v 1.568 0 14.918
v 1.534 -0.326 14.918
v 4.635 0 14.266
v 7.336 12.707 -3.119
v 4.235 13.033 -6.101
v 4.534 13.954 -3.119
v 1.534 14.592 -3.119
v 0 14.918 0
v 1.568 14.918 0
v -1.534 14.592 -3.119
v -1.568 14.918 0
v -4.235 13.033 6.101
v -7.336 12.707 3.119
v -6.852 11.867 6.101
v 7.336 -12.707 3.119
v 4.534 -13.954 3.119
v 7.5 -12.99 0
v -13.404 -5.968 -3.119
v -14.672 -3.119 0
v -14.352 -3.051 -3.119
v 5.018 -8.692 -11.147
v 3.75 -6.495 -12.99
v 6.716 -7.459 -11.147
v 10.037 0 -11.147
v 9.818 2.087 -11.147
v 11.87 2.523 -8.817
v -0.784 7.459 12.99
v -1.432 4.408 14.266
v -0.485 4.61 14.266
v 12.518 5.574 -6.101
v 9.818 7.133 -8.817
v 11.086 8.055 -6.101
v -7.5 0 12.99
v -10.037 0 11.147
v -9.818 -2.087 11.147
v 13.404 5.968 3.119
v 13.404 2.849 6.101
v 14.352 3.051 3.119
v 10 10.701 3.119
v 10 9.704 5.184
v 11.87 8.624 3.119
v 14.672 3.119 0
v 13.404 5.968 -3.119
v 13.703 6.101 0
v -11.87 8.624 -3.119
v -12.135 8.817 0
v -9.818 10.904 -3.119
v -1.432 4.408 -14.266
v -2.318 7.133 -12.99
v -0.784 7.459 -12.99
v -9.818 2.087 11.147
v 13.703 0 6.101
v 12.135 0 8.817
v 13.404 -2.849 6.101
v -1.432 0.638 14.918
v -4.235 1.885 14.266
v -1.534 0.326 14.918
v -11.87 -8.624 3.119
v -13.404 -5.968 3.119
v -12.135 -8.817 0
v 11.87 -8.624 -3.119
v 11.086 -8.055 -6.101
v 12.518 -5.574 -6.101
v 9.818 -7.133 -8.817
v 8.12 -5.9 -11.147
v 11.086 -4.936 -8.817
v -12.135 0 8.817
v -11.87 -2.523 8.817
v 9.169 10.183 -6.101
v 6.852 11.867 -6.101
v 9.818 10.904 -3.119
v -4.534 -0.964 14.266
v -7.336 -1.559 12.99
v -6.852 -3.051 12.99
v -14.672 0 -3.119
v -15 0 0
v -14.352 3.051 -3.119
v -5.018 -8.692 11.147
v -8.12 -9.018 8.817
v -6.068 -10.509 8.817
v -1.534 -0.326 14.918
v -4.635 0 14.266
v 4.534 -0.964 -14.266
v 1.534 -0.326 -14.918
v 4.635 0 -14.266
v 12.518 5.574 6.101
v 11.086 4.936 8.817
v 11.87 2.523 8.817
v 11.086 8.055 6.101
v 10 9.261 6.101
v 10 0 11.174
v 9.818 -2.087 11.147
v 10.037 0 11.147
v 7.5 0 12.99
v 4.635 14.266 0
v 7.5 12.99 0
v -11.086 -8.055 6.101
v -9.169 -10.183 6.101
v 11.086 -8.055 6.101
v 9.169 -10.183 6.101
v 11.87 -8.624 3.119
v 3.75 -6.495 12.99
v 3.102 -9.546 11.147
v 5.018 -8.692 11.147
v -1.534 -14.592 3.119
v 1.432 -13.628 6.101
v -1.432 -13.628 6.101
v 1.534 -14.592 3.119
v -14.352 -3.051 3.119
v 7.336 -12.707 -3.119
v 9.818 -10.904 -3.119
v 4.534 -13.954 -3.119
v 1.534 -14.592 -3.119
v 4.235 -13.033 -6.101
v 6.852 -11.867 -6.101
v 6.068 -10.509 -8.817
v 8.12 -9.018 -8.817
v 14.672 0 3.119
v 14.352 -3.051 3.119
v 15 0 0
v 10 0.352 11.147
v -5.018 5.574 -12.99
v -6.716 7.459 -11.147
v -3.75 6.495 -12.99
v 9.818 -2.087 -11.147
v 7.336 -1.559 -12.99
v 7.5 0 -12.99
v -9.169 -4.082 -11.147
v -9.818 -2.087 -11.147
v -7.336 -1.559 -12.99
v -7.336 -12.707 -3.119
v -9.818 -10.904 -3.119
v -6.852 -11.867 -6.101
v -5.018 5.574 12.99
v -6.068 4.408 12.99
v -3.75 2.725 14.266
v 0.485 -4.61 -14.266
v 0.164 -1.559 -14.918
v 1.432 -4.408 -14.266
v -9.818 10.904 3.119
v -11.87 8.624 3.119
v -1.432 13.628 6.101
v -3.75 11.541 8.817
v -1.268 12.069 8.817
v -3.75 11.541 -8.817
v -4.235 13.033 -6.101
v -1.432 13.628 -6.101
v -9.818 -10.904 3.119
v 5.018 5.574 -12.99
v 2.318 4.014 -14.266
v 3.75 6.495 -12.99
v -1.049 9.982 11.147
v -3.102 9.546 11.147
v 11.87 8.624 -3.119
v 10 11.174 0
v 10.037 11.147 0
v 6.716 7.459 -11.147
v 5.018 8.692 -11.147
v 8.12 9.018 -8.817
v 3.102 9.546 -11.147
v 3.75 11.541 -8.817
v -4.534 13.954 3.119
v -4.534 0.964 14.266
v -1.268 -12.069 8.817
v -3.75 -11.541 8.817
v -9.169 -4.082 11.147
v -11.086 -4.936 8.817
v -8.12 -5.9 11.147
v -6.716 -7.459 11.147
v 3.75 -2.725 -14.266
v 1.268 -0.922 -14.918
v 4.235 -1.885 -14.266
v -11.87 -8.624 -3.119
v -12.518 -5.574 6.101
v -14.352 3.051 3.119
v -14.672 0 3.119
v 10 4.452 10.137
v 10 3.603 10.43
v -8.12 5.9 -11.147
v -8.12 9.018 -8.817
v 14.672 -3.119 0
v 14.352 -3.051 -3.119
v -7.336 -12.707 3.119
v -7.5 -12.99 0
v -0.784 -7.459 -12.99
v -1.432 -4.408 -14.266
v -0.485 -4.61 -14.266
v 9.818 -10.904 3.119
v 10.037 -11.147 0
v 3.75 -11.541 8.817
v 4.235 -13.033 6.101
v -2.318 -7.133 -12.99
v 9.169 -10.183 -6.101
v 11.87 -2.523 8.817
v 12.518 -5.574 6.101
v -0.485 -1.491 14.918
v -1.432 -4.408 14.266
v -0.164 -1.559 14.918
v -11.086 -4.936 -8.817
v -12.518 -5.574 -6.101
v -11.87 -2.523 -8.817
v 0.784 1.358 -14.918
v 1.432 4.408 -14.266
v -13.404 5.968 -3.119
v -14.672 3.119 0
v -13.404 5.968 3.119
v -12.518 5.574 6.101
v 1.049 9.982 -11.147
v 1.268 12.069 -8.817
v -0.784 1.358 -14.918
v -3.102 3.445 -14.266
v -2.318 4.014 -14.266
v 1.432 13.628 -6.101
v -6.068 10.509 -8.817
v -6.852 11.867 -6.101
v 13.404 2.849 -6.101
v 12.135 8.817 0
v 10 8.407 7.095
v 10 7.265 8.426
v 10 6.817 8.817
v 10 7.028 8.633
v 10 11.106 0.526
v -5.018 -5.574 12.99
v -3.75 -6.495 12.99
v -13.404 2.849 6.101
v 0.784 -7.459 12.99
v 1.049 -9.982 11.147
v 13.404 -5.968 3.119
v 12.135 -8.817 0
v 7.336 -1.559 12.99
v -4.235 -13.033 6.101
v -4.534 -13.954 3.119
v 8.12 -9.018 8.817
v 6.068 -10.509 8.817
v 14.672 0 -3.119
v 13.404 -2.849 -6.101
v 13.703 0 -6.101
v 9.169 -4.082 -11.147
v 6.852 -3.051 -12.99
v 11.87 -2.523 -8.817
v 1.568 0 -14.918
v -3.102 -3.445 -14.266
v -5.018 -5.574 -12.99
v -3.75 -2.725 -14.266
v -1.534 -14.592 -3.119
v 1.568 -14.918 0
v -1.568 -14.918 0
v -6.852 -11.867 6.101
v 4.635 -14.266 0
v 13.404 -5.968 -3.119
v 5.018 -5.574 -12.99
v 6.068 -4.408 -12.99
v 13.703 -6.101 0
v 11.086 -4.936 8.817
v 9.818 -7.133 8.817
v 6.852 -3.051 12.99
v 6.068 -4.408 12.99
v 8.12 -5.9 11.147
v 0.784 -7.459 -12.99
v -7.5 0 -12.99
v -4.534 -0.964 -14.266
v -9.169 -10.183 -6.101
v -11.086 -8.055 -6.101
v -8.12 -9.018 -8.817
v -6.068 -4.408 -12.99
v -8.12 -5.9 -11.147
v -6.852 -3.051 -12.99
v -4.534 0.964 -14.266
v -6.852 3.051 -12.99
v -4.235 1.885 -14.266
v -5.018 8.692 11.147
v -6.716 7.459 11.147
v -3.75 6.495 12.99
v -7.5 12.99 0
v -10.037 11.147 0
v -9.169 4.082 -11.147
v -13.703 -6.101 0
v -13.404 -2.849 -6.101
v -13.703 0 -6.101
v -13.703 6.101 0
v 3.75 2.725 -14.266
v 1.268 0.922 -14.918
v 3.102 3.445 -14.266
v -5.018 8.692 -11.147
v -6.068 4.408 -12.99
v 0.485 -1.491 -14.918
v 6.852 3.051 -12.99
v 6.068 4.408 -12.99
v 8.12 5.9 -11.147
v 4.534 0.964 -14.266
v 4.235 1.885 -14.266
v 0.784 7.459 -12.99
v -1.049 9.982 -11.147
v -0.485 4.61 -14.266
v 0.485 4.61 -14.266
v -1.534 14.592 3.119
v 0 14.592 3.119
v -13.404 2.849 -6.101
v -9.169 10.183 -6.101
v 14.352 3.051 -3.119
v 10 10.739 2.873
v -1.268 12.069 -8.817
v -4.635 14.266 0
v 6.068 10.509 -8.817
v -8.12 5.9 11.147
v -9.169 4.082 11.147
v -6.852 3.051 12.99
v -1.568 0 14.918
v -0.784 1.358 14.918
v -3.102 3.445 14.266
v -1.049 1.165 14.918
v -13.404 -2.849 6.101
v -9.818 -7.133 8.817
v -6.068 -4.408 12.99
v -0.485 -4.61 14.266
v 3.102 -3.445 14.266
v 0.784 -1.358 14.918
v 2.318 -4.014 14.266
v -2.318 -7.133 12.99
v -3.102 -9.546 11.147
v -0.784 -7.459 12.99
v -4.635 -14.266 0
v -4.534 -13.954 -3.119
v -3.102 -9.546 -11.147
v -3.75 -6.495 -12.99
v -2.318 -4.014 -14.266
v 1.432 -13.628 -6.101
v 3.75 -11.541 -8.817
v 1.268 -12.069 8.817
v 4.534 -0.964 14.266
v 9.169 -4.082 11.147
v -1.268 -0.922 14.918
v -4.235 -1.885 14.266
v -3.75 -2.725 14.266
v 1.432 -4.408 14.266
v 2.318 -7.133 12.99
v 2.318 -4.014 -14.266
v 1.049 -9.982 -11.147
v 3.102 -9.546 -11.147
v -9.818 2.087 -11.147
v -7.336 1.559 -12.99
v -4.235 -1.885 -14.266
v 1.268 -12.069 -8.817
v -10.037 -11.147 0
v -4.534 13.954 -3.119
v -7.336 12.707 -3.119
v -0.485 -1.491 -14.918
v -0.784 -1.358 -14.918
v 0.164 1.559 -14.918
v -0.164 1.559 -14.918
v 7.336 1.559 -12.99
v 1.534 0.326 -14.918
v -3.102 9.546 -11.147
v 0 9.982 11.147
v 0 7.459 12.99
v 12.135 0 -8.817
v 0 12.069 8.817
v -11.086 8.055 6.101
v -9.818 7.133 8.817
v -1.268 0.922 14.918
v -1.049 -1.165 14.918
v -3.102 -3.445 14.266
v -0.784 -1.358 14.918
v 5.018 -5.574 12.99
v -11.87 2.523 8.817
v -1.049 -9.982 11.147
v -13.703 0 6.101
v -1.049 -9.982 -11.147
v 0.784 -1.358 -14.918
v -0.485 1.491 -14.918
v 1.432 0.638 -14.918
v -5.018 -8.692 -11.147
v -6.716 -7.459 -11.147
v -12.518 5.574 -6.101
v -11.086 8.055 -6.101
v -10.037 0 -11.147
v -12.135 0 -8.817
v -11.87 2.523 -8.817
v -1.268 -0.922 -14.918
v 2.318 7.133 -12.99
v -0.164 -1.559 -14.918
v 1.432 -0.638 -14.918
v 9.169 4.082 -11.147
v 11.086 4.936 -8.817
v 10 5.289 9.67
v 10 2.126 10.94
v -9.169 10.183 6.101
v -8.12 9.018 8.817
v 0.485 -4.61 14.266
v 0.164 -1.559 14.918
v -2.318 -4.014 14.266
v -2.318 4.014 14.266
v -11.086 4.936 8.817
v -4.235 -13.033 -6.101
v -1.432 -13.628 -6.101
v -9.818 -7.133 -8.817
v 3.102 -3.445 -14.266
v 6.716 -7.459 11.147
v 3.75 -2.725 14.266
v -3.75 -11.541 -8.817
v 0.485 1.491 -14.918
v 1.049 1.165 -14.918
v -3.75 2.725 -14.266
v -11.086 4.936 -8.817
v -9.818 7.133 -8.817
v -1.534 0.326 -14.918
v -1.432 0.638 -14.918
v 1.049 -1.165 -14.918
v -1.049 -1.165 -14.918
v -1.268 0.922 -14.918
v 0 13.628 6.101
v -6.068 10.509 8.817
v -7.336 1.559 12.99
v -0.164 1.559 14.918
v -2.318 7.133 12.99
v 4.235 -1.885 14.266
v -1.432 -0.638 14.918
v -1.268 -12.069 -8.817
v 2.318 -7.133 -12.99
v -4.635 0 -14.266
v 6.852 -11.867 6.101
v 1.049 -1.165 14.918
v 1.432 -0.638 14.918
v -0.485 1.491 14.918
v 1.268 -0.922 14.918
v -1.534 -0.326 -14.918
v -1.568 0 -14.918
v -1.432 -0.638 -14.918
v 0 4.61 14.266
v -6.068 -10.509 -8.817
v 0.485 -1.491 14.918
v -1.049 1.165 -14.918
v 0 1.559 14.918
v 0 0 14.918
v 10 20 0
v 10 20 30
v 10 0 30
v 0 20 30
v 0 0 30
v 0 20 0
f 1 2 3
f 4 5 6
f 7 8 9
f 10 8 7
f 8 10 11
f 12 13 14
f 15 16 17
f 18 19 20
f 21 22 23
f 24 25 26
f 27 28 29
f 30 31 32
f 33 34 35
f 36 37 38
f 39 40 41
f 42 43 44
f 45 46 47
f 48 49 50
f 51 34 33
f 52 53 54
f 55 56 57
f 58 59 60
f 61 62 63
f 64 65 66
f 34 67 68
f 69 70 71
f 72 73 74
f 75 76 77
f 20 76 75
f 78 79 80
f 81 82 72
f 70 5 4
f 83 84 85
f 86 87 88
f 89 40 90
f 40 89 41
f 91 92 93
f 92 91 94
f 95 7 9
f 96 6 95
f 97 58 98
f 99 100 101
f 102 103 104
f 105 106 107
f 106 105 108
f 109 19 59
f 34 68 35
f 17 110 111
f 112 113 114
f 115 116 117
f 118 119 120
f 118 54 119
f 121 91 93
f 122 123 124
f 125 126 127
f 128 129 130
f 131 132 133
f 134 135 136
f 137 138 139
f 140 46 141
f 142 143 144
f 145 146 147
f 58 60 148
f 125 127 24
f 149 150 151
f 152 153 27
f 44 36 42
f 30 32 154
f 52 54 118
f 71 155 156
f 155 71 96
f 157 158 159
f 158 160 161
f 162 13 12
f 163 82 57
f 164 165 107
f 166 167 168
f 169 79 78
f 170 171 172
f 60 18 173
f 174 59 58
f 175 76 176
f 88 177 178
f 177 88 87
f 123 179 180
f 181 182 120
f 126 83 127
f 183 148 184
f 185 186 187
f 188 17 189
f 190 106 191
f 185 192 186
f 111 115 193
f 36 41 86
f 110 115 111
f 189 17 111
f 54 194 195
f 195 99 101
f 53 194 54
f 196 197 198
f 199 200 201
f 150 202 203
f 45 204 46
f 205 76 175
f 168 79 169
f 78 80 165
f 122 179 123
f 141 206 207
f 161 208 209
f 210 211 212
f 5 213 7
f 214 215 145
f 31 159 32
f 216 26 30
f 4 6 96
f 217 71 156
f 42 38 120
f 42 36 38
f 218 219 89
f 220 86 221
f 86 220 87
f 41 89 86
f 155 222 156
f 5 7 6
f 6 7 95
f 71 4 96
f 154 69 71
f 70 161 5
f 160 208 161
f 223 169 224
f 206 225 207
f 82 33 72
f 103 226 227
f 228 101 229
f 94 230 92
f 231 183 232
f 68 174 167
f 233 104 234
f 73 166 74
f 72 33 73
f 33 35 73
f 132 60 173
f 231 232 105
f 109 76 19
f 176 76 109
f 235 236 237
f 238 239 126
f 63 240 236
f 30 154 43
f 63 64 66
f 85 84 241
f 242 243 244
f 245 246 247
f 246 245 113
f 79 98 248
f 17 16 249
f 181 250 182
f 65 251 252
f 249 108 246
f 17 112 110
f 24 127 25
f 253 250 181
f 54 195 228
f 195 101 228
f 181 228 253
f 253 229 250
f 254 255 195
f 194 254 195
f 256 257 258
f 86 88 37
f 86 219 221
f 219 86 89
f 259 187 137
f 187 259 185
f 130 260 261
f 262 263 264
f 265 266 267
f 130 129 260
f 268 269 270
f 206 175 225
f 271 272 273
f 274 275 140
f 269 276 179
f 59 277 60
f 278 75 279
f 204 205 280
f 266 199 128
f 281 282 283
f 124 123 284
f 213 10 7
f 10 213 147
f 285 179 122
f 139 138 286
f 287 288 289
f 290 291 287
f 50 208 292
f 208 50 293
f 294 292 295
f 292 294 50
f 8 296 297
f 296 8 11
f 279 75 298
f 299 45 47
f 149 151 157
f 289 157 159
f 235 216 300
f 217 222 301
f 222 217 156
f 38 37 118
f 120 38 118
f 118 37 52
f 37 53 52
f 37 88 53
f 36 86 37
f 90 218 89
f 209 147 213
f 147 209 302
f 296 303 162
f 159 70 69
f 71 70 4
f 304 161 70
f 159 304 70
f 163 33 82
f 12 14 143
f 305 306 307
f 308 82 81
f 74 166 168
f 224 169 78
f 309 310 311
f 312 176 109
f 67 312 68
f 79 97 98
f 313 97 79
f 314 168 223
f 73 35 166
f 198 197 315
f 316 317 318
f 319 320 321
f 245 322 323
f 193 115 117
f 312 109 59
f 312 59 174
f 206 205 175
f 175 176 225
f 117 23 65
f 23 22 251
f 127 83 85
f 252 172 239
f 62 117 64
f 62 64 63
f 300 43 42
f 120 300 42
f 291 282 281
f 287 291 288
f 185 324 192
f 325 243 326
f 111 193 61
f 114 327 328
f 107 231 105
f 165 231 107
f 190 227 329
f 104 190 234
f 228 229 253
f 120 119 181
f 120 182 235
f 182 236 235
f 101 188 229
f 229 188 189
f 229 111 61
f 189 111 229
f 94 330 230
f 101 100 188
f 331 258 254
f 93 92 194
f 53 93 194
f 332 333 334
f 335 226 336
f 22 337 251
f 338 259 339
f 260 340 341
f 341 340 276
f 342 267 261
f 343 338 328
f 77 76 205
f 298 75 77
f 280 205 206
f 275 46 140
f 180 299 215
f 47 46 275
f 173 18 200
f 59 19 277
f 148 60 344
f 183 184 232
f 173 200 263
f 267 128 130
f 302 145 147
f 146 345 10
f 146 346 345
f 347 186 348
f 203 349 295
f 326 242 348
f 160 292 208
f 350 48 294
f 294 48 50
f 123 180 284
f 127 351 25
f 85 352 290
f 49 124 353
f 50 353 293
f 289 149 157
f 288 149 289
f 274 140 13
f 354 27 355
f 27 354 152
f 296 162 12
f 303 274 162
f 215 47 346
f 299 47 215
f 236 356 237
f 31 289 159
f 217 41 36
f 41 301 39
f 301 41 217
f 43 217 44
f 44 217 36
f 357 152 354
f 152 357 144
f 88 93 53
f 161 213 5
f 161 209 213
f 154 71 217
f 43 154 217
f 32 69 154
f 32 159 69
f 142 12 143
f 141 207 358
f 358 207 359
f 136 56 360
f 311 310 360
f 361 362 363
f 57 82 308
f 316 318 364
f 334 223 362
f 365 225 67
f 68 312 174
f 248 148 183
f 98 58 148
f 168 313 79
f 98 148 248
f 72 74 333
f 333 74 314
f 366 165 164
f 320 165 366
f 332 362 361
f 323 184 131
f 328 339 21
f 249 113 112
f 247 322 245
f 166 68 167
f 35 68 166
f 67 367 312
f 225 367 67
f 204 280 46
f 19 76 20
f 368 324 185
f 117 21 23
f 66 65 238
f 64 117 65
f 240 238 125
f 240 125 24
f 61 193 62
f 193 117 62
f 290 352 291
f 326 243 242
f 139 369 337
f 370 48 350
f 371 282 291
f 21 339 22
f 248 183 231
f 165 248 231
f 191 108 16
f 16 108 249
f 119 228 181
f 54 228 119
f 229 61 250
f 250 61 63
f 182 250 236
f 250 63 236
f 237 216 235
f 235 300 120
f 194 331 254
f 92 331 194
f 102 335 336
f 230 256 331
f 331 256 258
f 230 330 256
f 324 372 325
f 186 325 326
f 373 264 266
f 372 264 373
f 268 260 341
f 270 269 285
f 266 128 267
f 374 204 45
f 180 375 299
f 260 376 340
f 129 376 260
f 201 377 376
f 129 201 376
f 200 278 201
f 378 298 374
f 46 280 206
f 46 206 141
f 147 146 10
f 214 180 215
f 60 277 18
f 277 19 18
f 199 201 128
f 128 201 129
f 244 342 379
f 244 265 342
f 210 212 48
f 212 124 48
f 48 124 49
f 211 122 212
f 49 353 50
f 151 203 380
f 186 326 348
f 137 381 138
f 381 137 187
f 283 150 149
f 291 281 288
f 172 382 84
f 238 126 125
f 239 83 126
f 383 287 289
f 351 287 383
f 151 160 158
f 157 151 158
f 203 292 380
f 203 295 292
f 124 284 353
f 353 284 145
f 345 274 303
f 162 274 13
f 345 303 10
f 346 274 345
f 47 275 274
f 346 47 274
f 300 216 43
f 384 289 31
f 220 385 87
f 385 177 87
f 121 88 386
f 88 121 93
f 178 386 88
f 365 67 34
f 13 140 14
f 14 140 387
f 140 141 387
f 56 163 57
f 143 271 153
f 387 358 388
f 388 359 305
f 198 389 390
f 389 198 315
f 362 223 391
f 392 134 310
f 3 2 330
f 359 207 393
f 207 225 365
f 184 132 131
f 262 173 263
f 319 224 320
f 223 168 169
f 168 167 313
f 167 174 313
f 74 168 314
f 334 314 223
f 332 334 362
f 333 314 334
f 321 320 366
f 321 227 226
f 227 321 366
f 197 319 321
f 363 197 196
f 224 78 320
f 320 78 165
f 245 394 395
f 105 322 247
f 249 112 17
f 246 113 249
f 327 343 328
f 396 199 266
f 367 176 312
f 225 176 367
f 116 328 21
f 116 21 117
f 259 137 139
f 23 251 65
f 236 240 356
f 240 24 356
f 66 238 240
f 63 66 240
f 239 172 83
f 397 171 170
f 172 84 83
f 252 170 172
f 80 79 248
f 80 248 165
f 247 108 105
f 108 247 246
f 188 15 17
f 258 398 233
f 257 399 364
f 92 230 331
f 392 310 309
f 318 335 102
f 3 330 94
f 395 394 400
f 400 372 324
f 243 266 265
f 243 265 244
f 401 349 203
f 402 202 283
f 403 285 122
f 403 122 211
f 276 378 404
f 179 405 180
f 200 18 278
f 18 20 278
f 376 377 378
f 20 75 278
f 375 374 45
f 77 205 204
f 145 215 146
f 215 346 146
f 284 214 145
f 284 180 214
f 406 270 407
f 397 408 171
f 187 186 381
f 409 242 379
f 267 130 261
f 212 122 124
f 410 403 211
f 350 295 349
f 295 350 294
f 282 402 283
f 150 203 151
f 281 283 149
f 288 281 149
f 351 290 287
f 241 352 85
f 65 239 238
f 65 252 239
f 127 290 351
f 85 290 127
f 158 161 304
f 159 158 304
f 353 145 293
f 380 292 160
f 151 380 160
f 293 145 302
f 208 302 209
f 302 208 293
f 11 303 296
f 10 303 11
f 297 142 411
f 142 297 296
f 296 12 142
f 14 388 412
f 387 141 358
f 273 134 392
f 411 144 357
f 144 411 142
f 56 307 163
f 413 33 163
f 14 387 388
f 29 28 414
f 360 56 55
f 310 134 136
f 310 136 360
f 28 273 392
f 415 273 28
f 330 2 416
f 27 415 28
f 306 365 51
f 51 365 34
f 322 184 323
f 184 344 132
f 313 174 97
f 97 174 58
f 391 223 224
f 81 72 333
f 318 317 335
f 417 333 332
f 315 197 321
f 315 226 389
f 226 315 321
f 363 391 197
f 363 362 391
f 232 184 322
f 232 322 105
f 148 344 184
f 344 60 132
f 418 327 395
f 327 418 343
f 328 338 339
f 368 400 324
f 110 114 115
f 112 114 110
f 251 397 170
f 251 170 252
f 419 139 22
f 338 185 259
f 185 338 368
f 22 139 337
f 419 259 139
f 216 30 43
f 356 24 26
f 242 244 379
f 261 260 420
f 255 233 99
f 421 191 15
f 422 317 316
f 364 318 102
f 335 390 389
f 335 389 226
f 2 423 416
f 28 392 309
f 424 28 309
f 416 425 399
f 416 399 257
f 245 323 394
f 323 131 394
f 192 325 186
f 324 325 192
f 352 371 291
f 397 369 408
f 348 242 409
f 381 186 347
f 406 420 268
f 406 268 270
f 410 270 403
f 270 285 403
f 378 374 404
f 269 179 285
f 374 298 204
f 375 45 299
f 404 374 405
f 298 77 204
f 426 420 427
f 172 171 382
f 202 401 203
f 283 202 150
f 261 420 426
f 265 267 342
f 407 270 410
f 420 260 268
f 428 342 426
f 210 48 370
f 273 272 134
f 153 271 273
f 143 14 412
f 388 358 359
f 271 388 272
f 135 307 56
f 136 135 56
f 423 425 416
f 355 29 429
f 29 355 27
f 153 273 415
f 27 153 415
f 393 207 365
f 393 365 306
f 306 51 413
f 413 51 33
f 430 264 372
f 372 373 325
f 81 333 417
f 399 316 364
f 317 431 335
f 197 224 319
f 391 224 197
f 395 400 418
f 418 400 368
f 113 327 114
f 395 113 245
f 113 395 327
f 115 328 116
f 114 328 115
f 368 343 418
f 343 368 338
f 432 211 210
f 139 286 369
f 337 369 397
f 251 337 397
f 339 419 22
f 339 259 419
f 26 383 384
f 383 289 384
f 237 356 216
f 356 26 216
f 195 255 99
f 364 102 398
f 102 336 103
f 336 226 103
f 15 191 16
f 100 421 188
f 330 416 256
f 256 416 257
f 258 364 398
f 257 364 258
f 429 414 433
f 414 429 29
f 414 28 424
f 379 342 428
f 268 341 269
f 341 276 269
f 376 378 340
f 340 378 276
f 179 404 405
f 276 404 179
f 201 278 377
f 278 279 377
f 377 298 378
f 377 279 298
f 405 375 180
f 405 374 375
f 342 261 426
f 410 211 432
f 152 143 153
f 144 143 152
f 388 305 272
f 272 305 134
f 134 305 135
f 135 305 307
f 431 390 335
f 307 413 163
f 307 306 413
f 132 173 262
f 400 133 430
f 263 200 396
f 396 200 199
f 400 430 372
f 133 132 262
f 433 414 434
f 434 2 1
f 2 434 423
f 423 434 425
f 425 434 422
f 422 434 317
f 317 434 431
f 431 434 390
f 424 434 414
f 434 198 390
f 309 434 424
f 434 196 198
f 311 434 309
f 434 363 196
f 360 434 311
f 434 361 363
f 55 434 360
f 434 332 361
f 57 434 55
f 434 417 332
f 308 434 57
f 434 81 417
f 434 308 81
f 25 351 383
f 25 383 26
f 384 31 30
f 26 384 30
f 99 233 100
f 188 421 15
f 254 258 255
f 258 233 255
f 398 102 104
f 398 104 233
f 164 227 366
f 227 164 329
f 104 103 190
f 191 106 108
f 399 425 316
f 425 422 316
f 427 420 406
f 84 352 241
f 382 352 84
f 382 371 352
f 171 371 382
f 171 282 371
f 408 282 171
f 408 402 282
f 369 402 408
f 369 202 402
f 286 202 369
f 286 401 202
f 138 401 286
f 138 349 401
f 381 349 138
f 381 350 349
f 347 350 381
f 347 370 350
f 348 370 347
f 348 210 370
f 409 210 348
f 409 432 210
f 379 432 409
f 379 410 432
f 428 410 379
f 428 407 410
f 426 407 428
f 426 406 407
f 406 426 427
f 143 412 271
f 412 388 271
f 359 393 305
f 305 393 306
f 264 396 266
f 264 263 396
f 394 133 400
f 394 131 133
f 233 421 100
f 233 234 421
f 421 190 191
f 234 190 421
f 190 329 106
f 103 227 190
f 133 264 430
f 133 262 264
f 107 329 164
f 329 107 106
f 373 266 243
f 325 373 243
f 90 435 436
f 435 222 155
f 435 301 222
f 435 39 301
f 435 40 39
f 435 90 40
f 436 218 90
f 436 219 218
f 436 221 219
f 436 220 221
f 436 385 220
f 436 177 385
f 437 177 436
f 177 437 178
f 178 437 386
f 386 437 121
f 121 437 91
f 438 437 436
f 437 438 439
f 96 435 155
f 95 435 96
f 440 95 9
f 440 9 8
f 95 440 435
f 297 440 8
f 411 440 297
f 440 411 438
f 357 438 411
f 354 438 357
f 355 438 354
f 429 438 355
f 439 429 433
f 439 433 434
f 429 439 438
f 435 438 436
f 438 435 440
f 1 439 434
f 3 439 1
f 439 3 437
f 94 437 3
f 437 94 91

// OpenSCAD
union() {
sphere(d=30);
cube(size=[10,20,30]);
}

/*
<json>
    {
        "Name": "Vertical Pillars",
        "Desc": "Use the slider to indicate how many columns printed acceptably.",
        "LowKeyword": "Lost",
        "HighKeyword": "Printed",
        "varBase": "VarBase1",
        "minDefault": 0.1,
        "maxDefault": 2,
        "minDefaultND": "0.5 * nozzleDiameter",
        "maxDefaultND": "5 * nozzleDiameter",
        "cameraData": "-2.28,2.59,6.06,59.9,0,13.8,113.4",
        "sortOrder": 0
    }
</json>
*/
